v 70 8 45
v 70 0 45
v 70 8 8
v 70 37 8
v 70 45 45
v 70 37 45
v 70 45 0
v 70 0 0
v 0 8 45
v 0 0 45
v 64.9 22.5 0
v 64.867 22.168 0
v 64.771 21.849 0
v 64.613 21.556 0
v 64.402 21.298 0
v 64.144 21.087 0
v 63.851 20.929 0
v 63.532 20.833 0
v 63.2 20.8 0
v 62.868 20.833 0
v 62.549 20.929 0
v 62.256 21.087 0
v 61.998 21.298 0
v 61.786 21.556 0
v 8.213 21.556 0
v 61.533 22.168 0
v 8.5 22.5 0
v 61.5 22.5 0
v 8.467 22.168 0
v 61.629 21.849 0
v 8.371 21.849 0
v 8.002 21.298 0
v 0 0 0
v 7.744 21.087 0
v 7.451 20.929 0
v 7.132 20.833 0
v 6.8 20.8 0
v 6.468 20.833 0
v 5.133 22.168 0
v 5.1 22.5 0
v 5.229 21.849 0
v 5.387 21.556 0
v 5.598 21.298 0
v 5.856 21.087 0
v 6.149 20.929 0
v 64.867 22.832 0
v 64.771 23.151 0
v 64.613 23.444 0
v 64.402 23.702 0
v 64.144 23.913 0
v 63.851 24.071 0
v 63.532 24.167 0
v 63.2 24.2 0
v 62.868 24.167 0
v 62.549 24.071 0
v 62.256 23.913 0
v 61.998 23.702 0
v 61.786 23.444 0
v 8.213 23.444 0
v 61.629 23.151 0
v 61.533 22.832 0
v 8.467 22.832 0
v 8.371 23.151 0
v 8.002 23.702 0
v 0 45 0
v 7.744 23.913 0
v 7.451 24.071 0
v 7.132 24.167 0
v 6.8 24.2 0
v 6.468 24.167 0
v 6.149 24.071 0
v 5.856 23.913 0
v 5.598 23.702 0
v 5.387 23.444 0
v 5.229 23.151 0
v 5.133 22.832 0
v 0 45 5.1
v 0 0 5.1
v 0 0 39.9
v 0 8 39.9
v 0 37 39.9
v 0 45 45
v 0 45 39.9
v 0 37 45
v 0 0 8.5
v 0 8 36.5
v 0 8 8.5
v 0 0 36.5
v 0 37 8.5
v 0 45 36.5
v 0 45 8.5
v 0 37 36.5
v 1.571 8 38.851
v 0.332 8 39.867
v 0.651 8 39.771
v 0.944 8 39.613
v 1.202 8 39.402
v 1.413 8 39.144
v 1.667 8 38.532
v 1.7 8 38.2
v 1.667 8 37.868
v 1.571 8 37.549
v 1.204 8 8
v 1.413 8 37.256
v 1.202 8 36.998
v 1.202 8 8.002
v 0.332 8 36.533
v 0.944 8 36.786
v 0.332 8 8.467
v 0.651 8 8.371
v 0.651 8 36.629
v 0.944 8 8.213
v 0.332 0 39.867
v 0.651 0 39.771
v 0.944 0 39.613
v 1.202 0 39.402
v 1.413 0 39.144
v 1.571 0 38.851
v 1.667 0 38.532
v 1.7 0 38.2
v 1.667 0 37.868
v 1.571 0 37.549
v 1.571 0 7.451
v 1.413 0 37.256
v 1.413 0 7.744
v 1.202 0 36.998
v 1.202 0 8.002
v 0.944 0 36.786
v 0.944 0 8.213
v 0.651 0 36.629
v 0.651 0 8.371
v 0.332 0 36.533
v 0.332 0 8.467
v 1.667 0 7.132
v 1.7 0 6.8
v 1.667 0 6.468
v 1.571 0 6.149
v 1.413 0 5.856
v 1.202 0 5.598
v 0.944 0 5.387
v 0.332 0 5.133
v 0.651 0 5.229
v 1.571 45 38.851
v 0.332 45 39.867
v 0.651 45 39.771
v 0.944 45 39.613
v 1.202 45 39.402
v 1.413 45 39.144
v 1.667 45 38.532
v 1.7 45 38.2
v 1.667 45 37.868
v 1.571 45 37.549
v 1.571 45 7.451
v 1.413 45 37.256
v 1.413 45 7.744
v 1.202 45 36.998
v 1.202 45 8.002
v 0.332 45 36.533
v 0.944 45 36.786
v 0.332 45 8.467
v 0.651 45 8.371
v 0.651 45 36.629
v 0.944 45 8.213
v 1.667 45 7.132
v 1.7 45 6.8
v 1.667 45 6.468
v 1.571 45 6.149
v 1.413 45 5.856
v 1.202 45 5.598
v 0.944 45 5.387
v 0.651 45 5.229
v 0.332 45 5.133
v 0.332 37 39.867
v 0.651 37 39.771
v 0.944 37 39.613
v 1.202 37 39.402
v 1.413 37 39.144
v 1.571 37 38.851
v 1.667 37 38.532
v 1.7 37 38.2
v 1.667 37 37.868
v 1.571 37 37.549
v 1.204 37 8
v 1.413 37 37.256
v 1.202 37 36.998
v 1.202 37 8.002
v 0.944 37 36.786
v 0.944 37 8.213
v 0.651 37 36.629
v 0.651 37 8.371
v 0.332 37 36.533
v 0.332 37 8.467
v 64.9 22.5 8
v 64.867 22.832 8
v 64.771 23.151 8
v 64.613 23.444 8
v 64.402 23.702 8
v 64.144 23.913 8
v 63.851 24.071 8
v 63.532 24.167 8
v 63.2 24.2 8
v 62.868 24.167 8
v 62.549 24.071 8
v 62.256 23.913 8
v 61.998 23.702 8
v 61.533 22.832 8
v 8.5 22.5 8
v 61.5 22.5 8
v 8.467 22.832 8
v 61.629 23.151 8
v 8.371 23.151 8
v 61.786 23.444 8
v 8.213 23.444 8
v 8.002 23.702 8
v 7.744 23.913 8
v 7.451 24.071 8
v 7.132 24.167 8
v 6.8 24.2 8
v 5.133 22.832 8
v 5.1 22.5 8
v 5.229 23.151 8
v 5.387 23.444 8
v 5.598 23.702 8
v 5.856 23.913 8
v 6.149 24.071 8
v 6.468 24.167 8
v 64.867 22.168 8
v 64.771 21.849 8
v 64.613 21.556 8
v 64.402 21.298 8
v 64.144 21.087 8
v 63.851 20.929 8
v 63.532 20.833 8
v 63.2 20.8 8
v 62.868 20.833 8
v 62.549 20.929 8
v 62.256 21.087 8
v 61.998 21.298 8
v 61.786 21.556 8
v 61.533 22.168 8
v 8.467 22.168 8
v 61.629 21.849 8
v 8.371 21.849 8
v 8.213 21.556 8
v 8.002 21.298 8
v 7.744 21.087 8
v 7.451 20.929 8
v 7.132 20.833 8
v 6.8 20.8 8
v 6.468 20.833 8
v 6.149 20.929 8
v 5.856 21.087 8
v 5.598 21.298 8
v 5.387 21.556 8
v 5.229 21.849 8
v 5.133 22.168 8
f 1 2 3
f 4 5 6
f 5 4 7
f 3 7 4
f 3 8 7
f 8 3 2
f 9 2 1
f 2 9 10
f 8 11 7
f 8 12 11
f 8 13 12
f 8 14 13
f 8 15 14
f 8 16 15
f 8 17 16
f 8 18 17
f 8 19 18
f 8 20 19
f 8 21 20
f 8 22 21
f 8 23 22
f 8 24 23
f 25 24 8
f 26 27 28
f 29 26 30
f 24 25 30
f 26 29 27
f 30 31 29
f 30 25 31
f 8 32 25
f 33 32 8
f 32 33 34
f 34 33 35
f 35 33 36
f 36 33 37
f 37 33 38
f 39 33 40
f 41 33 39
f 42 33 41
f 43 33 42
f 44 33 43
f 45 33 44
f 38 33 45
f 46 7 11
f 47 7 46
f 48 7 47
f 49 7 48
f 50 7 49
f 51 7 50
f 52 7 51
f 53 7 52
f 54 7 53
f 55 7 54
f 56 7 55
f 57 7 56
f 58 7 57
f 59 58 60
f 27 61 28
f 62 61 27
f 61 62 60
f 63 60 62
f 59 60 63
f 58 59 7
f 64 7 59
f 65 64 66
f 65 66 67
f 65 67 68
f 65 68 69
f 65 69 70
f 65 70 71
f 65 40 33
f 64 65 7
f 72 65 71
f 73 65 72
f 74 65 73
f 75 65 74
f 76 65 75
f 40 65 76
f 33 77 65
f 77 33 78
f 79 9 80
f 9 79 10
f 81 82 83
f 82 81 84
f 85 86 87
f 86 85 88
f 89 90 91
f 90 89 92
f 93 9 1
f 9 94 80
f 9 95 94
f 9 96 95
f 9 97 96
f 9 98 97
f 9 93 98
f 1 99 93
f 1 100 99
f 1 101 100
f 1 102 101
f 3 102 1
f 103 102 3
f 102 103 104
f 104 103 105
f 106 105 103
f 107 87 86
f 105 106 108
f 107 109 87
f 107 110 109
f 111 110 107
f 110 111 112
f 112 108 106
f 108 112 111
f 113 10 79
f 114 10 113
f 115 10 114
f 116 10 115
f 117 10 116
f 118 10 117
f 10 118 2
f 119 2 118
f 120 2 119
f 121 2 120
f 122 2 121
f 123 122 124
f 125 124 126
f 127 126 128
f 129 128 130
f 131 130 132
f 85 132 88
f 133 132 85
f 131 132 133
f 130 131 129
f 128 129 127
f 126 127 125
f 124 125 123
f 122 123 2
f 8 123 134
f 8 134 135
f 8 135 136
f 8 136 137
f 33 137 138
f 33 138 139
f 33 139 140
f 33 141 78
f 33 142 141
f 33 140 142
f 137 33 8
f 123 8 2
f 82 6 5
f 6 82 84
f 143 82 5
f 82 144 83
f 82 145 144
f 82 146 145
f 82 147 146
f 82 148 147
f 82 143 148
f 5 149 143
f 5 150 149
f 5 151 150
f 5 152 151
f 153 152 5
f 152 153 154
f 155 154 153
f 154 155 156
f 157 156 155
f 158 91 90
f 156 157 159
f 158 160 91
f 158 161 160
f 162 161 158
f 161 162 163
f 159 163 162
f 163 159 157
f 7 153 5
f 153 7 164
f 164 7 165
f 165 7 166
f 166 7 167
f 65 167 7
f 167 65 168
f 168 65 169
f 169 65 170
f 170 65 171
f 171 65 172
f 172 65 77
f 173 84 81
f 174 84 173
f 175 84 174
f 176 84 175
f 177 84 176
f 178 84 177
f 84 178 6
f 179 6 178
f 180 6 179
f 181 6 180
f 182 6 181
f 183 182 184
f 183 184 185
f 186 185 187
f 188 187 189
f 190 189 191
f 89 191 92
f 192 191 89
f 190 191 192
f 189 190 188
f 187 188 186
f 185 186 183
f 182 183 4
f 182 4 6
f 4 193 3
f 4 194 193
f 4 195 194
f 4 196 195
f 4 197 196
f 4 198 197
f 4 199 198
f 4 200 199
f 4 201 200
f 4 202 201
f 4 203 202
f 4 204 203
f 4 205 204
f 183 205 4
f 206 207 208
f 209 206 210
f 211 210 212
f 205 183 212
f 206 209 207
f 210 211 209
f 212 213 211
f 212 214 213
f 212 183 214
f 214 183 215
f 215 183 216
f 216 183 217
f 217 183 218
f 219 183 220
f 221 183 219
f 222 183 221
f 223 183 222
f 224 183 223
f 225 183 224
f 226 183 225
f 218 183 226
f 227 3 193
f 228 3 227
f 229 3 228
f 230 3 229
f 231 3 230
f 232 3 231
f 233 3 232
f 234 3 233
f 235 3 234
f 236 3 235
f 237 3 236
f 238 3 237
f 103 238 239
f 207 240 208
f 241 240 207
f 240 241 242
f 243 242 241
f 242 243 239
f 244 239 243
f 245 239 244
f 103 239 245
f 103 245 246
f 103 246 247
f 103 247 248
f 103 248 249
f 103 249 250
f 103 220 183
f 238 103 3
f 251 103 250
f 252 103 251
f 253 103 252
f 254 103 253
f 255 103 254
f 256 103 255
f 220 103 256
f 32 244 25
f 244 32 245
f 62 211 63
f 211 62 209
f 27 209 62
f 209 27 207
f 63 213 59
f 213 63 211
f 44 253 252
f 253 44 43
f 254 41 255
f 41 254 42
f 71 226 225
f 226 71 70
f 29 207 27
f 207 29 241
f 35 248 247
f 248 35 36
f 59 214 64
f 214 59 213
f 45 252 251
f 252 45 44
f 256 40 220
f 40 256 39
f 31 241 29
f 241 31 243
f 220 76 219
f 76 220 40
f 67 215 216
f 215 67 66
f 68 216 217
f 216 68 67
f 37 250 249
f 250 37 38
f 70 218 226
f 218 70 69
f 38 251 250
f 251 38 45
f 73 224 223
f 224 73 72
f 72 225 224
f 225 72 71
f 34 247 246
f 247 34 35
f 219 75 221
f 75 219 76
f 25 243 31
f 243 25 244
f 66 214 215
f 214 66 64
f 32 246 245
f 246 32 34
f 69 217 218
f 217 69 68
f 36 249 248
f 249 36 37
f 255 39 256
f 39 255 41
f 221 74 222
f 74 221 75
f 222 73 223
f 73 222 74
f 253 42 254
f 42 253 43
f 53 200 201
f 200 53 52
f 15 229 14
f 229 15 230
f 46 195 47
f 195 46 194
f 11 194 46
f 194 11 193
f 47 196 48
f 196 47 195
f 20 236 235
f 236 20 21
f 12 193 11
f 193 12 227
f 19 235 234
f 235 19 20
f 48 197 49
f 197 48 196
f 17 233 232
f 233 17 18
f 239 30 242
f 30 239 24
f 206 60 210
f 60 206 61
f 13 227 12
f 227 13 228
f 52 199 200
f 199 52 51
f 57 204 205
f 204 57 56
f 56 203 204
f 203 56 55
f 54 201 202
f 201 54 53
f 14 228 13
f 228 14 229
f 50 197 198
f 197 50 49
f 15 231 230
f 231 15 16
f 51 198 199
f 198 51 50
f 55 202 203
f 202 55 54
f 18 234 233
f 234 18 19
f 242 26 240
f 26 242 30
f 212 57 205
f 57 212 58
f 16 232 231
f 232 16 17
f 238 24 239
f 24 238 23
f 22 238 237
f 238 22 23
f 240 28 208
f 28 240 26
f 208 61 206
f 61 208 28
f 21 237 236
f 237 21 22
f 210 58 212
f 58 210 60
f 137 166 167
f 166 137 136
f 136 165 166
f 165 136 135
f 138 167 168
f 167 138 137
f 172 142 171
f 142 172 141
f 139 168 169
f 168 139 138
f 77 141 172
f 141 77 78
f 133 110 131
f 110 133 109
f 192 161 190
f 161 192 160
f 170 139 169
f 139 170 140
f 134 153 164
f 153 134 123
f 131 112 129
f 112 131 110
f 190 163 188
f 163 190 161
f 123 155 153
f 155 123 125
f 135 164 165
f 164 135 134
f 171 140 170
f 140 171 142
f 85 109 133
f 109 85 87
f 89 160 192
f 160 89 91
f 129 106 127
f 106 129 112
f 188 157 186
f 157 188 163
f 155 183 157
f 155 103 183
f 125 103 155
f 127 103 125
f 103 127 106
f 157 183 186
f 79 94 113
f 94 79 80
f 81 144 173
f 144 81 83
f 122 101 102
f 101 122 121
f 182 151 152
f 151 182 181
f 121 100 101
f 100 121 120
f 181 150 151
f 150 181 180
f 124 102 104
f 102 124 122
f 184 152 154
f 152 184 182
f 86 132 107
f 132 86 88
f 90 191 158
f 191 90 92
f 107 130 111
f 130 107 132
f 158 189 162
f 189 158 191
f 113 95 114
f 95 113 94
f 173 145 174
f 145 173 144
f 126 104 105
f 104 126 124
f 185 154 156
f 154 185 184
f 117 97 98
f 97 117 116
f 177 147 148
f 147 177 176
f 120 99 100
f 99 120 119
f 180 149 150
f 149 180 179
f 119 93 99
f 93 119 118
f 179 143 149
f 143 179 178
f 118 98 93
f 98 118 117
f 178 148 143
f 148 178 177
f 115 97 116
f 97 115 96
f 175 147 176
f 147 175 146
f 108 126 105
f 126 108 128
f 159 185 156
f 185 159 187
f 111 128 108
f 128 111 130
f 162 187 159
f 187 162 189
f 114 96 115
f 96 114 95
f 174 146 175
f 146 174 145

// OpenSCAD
$fn = 32;

// ----------------------------------------------------------------------
// U-bracket: 70 x 45 x 45 mm
// ----------------------------------------------------------------------

// --- parameters (mm) ---
base_len = 70;            // outer length, X
channel_w = 45;           // outer width, Y
upright_h = 45;           // upright height, Z
mat_t = 8;                // wall thickness
hole_d = 3.4;             // clearance for M3

module hole_z(px, py) {
  translate([px, py, -2.5]) cylinder(h = mat_t + 5, d = hole_d);
}
module hole_y_pz(pz) {
  /* through both uprights along Y */
  translate([0, -2.5, pz]) rotate([-90, 0, 0]) cylinder(h = channel_w + 5, d = hole_d);
}

module base() {
  cube([base_len, channel_w, mat_t]);
}

module uprights() {
  cube([base_len, mat_t, upright_h]);
  translate([0, channel_w - mat_t, 0]) cube([base_len, mat_t, upright_h]);
}

difference() {
  union() {
    base();
    uprights();
  }
  hole_z(6.8, 22.5);
  hole_z(63.2, 22.5);
  hole_y_pz(6.8);
  hole_y_pz(38.2);
}
